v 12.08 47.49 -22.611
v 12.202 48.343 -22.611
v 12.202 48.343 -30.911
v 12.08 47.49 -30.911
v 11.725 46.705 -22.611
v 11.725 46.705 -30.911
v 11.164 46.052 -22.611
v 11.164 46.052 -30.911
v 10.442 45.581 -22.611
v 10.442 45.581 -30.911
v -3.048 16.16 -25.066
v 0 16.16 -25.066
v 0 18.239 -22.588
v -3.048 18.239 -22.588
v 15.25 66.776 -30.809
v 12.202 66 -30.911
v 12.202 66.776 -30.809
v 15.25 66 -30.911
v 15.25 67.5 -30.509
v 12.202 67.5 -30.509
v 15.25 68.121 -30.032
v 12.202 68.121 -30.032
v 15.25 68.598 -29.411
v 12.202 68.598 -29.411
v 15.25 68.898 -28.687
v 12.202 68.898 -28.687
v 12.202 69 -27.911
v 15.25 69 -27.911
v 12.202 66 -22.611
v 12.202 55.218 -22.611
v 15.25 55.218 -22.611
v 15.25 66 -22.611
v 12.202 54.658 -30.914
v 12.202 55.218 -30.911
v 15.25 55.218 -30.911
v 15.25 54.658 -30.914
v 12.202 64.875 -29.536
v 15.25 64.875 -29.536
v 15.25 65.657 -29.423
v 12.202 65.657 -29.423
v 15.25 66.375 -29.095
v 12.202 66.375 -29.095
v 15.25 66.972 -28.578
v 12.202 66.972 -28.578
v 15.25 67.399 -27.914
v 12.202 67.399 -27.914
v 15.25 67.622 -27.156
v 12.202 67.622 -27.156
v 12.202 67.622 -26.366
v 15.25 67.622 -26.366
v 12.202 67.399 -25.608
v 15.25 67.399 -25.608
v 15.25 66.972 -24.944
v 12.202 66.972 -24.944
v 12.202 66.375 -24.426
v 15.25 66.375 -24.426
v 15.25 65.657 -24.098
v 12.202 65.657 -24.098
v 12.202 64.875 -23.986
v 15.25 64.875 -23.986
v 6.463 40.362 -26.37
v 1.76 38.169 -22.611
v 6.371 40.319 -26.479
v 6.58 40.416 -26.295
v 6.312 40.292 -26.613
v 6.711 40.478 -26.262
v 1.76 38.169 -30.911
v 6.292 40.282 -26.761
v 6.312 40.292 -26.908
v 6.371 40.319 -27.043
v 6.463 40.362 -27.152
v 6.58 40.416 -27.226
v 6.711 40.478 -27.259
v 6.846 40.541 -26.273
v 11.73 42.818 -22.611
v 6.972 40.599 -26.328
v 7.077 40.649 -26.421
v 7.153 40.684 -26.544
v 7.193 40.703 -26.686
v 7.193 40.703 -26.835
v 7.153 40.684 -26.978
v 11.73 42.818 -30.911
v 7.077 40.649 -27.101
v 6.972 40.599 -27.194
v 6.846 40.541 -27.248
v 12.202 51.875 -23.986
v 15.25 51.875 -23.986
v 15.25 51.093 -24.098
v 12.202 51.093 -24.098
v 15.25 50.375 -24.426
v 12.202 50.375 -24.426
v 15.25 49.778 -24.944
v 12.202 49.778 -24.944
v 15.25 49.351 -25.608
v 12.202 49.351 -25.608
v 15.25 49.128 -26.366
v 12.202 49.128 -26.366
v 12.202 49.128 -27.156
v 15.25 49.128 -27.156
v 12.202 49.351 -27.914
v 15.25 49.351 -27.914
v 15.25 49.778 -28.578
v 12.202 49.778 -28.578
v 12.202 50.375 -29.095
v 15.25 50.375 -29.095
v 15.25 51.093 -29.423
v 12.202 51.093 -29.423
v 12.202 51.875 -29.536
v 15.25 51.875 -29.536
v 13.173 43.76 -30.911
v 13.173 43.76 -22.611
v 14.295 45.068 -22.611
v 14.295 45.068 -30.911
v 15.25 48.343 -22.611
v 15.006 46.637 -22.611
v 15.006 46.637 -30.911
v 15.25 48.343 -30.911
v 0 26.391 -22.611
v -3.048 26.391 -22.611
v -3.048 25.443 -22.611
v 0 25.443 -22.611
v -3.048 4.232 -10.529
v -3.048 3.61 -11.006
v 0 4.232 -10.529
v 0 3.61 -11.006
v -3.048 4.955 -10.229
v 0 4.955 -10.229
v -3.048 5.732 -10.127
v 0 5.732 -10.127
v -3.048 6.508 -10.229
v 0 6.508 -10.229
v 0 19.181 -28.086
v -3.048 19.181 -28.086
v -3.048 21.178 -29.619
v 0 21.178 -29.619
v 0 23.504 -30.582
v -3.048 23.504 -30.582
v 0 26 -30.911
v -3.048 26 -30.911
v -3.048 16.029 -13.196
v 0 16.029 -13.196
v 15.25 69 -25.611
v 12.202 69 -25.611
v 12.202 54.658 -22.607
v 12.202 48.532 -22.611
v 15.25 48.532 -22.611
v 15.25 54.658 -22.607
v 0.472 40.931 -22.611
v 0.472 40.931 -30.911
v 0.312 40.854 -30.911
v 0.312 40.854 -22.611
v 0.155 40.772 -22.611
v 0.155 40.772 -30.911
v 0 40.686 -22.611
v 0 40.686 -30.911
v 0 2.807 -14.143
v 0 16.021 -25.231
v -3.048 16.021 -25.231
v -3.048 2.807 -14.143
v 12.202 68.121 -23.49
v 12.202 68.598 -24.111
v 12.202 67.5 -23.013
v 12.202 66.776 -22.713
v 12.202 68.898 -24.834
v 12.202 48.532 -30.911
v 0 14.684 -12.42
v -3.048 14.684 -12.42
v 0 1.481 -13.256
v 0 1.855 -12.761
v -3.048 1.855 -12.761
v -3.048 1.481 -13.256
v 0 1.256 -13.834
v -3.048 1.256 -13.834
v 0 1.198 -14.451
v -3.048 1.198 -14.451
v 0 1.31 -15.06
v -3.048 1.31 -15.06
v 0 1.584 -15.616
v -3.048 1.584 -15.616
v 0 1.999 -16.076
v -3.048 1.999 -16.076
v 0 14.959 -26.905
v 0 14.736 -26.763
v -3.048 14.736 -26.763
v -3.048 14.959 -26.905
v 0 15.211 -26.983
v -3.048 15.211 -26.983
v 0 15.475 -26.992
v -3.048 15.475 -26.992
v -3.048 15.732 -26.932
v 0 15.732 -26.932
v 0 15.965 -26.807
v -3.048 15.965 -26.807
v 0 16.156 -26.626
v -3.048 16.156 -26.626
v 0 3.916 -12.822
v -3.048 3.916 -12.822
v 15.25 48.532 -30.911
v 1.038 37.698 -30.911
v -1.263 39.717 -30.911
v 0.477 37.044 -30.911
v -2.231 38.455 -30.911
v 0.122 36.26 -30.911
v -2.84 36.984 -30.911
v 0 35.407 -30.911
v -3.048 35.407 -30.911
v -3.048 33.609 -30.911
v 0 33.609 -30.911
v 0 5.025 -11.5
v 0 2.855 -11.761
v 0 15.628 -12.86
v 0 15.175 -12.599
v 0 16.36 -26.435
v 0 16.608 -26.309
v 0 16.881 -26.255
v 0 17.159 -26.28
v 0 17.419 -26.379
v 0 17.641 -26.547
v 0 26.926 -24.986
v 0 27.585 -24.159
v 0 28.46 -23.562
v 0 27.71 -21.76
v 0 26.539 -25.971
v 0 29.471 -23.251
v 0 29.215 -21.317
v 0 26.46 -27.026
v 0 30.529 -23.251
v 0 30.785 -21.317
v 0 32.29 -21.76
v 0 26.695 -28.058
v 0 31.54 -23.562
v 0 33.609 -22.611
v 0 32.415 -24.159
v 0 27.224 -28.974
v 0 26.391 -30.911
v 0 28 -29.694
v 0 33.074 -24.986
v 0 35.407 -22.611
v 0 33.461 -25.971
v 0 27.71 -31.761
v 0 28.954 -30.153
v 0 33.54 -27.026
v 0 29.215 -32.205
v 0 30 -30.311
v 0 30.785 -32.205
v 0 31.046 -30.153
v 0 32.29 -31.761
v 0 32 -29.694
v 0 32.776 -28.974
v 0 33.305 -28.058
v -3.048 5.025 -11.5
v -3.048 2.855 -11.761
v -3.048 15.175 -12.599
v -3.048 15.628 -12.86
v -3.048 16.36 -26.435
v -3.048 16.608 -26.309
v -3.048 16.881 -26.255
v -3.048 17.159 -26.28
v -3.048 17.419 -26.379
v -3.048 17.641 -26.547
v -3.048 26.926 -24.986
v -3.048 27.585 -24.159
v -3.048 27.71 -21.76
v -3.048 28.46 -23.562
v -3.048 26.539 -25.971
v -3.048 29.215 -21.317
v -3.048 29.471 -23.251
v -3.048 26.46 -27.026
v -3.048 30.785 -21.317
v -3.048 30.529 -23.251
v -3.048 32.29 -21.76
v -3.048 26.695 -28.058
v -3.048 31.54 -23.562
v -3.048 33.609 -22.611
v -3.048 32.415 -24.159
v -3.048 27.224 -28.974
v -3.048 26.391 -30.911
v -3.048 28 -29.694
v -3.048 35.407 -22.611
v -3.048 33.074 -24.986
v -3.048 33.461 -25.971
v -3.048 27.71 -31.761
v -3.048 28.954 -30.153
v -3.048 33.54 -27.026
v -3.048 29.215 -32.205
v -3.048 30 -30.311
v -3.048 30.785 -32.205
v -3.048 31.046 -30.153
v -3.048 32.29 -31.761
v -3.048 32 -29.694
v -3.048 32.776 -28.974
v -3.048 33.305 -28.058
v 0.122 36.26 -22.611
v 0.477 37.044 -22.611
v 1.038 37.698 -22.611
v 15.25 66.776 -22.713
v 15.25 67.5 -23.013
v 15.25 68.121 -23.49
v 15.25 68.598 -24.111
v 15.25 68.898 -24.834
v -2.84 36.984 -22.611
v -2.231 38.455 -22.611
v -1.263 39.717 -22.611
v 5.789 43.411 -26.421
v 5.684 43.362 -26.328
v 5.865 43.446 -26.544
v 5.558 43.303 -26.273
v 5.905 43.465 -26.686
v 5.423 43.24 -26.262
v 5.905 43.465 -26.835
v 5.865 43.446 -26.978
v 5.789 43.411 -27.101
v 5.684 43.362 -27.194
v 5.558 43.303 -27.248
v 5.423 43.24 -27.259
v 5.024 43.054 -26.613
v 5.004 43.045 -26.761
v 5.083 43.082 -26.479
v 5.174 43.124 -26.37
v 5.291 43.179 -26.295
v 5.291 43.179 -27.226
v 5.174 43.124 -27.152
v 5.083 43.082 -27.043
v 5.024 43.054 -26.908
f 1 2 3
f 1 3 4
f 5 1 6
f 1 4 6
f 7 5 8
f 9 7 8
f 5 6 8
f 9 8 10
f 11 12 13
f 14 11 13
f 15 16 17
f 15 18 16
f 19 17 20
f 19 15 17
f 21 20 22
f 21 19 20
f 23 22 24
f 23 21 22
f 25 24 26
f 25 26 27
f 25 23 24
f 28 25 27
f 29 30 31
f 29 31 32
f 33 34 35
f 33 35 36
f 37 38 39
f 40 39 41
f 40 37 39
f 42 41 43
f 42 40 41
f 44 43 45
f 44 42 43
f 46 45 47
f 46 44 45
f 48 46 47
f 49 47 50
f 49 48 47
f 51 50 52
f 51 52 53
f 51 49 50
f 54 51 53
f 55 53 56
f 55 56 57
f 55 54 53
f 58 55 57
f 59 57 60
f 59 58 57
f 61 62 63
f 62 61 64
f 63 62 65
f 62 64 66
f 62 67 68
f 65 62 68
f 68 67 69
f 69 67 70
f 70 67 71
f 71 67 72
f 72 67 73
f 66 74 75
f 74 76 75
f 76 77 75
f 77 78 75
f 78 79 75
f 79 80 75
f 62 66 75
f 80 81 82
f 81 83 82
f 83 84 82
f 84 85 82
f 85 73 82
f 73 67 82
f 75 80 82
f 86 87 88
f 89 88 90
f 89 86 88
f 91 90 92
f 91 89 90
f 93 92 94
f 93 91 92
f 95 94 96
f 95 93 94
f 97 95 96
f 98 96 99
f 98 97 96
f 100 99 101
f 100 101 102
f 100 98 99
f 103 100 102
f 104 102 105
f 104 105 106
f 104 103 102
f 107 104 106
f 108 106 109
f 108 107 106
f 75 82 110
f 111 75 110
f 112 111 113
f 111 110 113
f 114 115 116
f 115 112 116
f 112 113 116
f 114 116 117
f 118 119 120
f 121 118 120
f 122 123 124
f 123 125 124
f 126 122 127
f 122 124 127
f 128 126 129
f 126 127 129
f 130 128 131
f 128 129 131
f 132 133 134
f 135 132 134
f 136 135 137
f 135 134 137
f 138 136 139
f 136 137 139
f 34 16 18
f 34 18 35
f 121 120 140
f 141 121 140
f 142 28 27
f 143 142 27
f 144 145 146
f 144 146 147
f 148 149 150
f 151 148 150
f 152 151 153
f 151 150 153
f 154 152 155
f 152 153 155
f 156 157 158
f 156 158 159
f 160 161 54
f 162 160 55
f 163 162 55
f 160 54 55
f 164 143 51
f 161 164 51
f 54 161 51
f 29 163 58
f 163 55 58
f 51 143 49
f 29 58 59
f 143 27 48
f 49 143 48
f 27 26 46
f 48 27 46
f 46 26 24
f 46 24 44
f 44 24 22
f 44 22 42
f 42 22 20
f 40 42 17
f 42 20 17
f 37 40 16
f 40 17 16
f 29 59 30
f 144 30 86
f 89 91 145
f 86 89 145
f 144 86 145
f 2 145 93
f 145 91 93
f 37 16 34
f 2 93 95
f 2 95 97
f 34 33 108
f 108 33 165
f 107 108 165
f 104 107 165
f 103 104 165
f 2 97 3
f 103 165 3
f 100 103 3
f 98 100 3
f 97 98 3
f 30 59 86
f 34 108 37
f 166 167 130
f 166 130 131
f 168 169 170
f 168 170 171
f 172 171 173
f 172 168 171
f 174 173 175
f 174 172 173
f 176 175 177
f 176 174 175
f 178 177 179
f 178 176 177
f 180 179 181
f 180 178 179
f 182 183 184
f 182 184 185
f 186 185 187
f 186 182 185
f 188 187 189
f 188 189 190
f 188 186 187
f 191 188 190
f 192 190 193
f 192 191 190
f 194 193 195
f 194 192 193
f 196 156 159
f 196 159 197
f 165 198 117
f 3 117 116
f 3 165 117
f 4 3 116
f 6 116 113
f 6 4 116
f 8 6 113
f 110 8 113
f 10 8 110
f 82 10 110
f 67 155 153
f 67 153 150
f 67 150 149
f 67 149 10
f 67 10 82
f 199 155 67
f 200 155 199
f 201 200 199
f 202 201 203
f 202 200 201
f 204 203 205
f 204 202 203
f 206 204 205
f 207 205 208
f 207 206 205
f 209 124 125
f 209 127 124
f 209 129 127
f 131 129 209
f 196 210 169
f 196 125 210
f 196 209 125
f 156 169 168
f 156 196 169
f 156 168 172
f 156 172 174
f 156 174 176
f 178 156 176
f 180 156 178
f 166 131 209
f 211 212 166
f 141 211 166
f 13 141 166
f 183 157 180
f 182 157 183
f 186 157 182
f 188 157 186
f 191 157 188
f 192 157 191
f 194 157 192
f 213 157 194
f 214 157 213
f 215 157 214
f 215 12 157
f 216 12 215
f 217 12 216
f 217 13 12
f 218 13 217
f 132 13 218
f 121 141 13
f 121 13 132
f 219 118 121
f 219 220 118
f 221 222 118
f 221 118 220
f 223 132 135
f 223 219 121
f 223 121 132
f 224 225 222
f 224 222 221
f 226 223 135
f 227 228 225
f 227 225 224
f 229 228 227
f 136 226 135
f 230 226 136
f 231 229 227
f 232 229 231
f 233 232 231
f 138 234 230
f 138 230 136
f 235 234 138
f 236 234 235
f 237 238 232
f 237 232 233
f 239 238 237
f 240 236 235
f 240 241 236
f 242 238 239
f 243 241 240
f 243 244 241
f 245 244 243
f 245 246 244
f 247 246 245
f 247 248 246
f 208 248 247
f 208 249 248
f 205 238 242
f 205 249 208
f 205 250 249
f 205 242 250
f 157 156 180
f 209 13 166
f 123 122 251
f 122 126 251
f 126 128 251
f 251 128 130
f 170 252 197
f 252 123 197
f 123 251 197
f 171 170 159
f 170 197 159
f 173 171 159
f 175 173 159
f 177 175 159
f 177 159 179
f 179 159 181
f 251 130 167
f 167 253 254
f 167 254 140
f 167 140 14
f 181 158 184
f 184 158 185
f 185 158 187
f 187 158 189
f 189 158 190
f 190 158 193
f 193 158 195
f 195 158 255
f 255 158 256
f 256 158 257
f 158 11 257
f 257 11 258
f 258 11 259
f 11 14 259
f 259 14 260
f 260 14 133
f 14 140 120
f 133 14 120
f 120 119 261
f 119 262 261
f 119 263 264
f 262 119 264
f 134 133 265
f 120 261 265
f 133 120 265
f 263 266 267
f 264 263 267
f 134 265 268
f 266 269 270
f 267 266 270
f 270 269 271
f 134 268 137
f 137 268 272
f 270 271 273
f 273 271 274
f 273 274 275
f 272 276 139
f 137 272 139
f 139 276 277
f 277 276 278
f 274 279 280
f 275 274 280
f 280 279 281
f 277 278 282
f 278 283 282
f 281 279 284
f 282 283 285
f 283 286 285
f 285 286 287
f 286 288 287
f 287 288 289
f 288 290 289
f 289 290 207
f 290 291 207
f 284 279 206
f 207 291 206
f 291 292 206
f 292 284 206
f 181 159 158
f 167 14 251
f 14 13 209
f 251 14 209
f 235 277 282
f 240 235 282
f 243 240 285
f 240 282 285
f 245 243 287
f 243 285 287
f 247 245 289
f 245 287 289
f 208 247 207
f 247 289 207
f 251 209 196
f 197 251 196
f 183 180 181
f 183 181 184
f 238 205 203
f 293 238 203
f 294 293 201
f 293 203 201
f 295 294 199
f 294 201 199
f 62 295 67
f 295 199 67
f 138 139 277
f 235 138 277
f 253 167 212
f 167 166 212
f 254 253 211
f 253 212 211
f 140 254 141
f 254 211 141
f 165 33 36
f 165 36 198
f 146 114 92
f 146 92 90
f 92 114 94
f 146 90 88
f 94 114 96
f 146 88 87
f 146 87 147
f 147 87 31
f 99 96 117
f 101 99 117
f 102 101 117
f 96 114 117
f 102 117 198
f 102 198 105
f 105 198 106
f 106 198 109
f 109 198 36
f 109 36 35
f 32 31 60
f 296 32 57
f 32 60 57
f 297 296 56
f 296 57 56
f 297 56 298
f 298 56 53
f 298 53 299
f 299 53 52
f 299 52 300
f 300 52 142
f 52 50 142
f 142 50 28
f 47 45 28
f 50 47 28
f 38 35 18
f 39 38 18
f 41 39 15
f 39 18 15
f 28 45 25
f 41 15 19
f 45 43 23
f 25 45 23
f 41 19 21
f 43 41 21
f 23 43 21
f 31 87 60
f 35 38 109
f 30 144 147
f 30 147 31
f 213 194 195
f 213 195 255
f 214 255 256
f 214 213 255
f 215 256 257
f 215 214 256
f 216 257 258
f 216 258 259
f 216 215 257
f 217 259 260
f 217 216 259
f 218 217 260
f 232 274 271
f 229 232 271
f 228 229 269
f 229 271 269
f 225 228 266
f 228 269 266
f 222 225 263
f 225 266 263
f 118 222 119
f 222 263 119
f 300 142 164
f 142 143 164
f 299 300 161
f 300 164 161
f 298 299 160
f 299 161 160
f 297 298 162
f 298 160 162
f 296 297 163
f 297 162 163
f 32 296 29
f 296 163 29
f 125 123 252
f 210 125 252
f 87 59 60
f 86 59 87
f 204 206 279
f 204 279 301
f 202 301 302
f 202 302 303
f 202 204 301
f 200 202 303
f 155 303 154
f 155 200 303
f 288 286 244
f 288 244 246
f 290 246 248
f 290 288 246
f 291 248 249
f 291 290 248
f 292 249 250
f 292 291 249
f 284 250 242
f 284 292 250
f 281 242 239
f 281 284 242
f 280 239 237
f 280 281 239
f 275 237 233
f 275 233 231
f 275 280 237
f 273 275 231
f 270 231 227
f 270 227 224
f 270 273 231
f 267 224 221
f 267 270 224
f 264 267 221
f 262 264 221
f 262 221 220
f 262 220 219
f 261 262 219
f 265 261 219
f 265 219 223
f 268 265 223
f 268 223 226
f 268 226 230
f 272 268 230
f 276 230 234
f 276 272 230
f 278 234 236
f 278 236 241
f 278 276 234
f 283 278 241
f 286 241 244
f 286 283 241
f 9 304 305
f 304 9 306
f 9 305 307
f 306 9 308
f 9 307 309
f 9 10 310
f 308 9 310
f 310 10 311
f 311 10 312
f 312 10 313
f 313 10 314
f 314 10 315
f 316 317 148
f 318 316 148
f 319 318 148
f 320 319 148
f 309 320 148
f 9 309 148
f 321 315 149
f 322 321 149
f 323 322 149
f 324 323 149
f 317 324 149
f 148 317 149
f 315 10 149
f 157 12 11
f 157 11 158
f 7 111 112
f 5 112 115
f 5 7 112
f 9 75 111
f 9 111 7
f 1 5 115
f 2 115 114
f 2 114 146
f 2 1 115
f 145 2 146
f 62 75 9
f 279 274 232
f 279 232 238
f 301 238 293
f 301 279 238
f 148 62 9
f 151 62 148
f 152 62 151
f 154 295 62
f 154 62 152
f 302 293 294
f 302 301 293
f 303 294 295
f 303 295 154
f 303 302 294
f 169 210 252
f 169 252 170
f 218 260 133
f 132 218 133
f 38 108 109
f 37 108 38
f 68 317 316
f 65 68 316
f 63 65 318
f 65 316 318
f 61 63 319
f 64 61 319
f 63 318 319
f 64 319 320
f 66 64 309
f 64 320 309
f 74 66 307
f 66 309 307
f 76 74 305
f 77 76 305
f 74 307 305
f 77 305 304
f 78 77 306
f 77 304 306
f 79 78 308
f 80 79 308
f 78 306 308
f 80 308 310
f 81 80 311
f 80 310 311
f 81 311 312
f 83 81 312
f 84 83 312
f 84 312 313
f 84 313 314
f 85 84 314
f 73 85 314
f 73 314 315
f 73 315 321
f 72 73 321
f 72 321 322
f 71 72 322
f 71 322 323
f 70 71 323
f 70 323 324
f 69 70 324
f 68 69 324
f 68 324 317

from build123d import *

# Parameters (mm, degrees)
BASE_FLANGE1_START     = -3.048
BASE_FLANGE1_OUTLINE_R = 3.55
BASE_FLANGE1_DEPTH     = 3.048
CHAMFER1_SIZE          = 5.5
CHAMFER1_SIZE2         = 9.526279442
FILLET5_R              = 3
JOG1_START             = -32.26085306
JOG1_DEPTH             = 22.133833772
JOG1_START_2           = -30.91085306
JOG1_2_DEPTH           = 1.375
JOG1_START_3           = -23.98585306
JOG1_3_DEPTH           = 1.375
JOG1_START_4           = -30.914437073
JOG1_4_DEPTH           = 8.307168025
JOG1_5_DEPTH           = 15.25
FILLET4_R              = 3
CUT_EXTRUDE3_DEPTH     = 78.680918765
BOSS_EXTRUDE1_DEPTH    = 3.048
CUT_EXTRUDE4_REACH     = 59.066
SKETCH15_R             = 0.5


with BuildPart() as part:
    # Base-Flange1: read off the stored shape, not the designer's step
    # Base-Flange1 outline → Base-Flange1 (new body)
    with BuildSketch(Plane(origin=(0, 0, 0), x_dir=(0, 0, -1), z_dir=(1, 0, 0)).offset(BASE_FLANGE1_START)):
        with BuildLine():
            Line((11.76085306, 2.855261469), (28.086146356, 19.180554765))
            ThreePointArc((28.086146356, 19.180554765), (30.176735706, 22.309342834), (30.91085306, 26))
            Line((30.91085306, 26), (30.91085306, 26.390637175))
            ThreePointArc((30.91085306, 26.390637175), (32.26085306, 30), (30.91085306, 33.609362825))
            Line((30.91085306, 33.609362825), (30.91085306, 48.531723164))
            Line((30.91085306, 48.531723164), (30.914437073, 54.658476217))
            Line((30.914437073, 54.658476217), (30.91085306, 55.218276836))
            Line((30.91085306, 55.218276836), (30.91085306, 69))
            Line((30.91085306, 69), (22.61085306, 69))
            Line((22.61085306, 69), (22.61085306, 55.218276836))
            Line((22.61085306, 55.218276836), (22.607269048, 54.658476217))
            Line((22.607269048, 54.658476217), (22.61085306, 48.531723164))
            Line((22.61085306, 48.531723164), (22.61085306, 33.609362825))
            ThreePointArc((22.61085306, 33.609362825), (21.26085306, 30), (22.61085306, 26.390637175))
            Line((22.61085306, 26.390637175), (22.61085306, 25.443234037))
            Line((22.61085306, 25.443234037), (5.891866776, 8.724247753))
            Line((5.891866776, 8.724247753), (11.76085306, 2.855261469))
        make_face()
        with Locations((26.76085306, 30)):
            Circle(BASE_FLANGE1_OUTLINE_R, mode=Mode.SUBTRACT)
        with BuildLine():
            ThreePointArc((23.98585306, 64.875), (26.76085306, 67.65), (29.53585306, 64.875))
            Line((29.53585306, 64.875), (29.53585306, 51.875))
            ThreePointArc((29.53585306, 51.875), (26.76085306, 49.1), (23.98585306, 51.875))
            Line((23.98585306, 51.875), (23.98585306, 64.875))
        make_face(mode=Mode.SUBTRACT)
    extrude(amount=BASE_FLANGE1_DEPTH)

    # Chamfer1
    chamfer1_edges = [part.edges().sort_by_distance(p)[0] for p in [
        (-1.524, 8.724247753, -5.891866776),
    ]]
    chamfer1_side = [part.faces().sort_by_distance(p)[0] for p in [
        (-1.524, 5.789754611, -8.826359918),
    ]]
    chamfer(chamfer1_edges, length=CHAMFER1_SIZE, length2=CHAMFER1_SIZE2, reference=chamfer1_side[0])

    # Fillet5
    fillet5_edges = [part.edges().sort_by_distance(p)[0] for p in [
        (-1.524, 15.460344546, -12.627963569),
        (-1.524, 4.835160456, -9.780954073),
    ]]
    fillet(fillet5_edges, radius=FILLET5_R)

    # Jog1: read off the stored shape, not the designer's step
    # Jog1 outline → Jog1 (cut)
    with BuildSketch(Plane.XY.offset(JOG1_START)):
        with BuildLine():
            ThreePointArc((-3.048, 35.406615264), (-2.231290862, 38.454615264), (0, 40.685906126))
            Line((0, 40.685906126), (0, 69))
            Line((0, 69), (-3.048, 69))
            Line((-3.048, 69), (-3.048, 35.406615264))
        make_face()
    extrude(amount=JOG1_DEPTH, mode=Mode.SUBTRACT)

    # Jog1 2 outline → Jog1 2 (add)
    with BuildSketch(Plane.XY.offset(JOG1_START_2)):
        with BuildLine():
            ThreePointArc((0, 35.406615264), (0.477342873, 37.04430447), (1.759859538, 38.169041399))
            Line((1.759859538, 38.169041399), (11.730280924, 42.818325246))
            ThreePointArc((11.730280924, 42.818325246), (14.295314254, 45.067799104), (15.25, 48.343177516))
            Line((15.25, 48.343177516), (15.25, 69))
            Line((15.25, 69), (12.202, 69))
            Line((12.202, 69), (12.202, 48.343177516))
            ThreePointArc((12.202, 48.343177516), (11.724657127, 46.70548831), (10.442140462, 45.580751381))
            Line((10.442140462, 45.580751381), (0.471719076, 40.931467534))
            ThreePointArc((0.471719076, 40.931467534), (0.233180454, 40.813833303), (0, 40.685906126))
            Line((0, 40.685906126), (0, 35.406615264))
        make_face()
    extrude(amount=JOG1_2_DEPTH)

    # Jog1 3 outline → Jog1 3 (add)
    with BuildSketch(Plane.XY.offset(JOG1_START_3)):
        with BuildLine():
            ThreePointArc((0, 35.406615264), (0.477342873, 37.04430447), (1.759859538, 38.169041399))
            Line((1.759859538, 38.169041399), (11.730280924, 42.818325246))
            ThreePointArc((11.730280924, 42.818325246), (14.295314254, 45.067799104), (15.25, 48.343177516))
            Line((15.25, 48.343177516), (15.25, 69))
            Line((15.25, 69), (12.202, 69))
            Line((12.202, 69), (12.202, 48.343177516))
            ThreePointArc((12.202, 48.343177516), (11.724657127, 46.70548831), (10.442140462, 45.580751381))
            Line((10.442140462, 45.580751381), (0.471719076, 40.931467534))
            ThreePointArc((0.471719076, 40.931467534), (0.233180454, 40.813833303), (0, 40.685906126))
            Line((0, 40.685906126), (0, 35.406615264))
        make_face()
    extrude(amount=JOG1_3_DEPTH)

    # Jog1 4 outline → Jog1 4 (add)
    with BuildSketch(Plane.XY.offset(JOG1_START_4)):
        with BuildLine():
            ThreePointArc((0, 35.406615264), (0.477342873, 37.04430447), (1.759859538, 38.169041399))
            Line((1.759859538, 38.169041399), (11.730280924, 42.818325246))
            ThreePointArc((11.730280924, 42.818325246), (14.295314254, 45.067799104), (15.25, 48.343177516))
            Line((15.25, 48.343177516), (15.25, 69))
            Line((15.25, 69), (12.202, 69))
            Line((12.202, 69), (12.202, 48.343177516))
            ThreePointArc((12.202, 48.343177516), (11.724657127, 46.70548831), (10.442140462, 45.580751381))
            Line((10.442140462, 45.580751381), (0.471719076, 40.931467534))
            ThreePointArc((0.471719076, 40.931467534), (0.233180454, 40.813833303), (0, 40.685906126))
            Line((0, 40.685906126), (0, 35.406615264))
        make_face()
    extrude(amount=JOG1_4_DEPTH)

    # Jog1 5 outline → Jog1 5 (cut)
    with BuildSketch(Plane.YZ):
        Polygon((48.531723164, -30.91085306), (34, -30.91085306), (34, -30.914437073), (54.658476217, -30.914437073), align=None)
        Polygon((34, -22.607269048), (34, -22.61085306), (48.531723164, -22.61085306), (54.658476217, -22.607269048), align=None)
        Polygon((55.218276836, -30.91085306), (54.658476217, -30.914437073), (70, -30.914437073), (70, -30.91085306), align=None)
        Polygon((70, -22.607269048), (54.658476217, -22.607269048), (55.218276836, -22.61085306), (70, -22.61085306), align=None)
        with BuildLine():
            Line((64.875, -23.98585306), (51.875, -23.98585306))
            ThreePointArc((51.875, -23.98585306), (49.1, -26.76085306), (51.875, -29.53585306))
            Line((51.875, -29.53585306), (64.875, -29.53585306))
            ThreePointArc((64.875, -29.53585306), (67.65, -26.76085306), (64.875, -23.98585306))
        make_face()
    extrude(amount=JOG1_5_DEPTH, mode=Mode.SUBTRACT)

    # Fillet4
    fillet4_edges = [part.edges().sort_by_distance(p)[0] for p in [
        (13.726, 69, -30.91085306),
        (13.726, 69, -22.61085306),
    ]]
    fillet(fillet4_edges, radius=FILLET4_R)

    # Sketch14<4> → Cut-Extrude3 (cut, through all)
    with BuildSketch(Plane(origin=(0, 0, 0), x_dir=(0, 0, -1), z_dir=(1, 0, 0))):
        Polygon((11.500086567, 5.024730268), (12.821513232, 3.915921641), (25.065698027, 16.160106436), (22.588172835, 18.238996911), align=None)
        Polygon((25.065698027, 16.160106436), (12.821513232, 3.915921641), (14.142939896, 2.807113014), (25.231026163, 16.021379658), align=None)
    extrude(amount=-CUT_EXTRUDE3_DEPTH, mode=Mode.SUBTRACT)

    # Sketch14 → Boss-Extrude1 (add)
    with BuildSketch(Plane(origin=(0, 0, 0), x_dir=(0, 0, -1), z_dir=(1, 0, 0))):
        with BuildLine():
            Line((12.821513232, 3.915921641), (11.76085306, 2.855261469))
            Line((11.76085306, 2.855261469), (12.761421716, 1.854692814))
            ThreePointArc((12.761421716, 1.854692814), (14.450555595, 1.197824573), (16.07601197, 1.999410949))
            Line((16.07601197, 1.999410949), (26.76311505, 14.735804439))
            ThreePointArc((26.76311505, 14.735804439), (26.992415169, 15.474972553), (26.625555608, 16.156413752))
            ThreePointArc((26.625555608, 16.156413752), (26.255439336, 16.881363004), (26.546933828, 17.641342237))
            Line((26.546933828, 17.641342237), (25.065698027, 16.160106436))
            Line((25.065698027, 16.160106436), (25.231026163, 16.021379658))
            Line((25.231026163, 16.021379658), (14.142939896, 2.807113014))
            Line((14.142939896, 2.807113014), (12.821513232, 3.915921641))
        make_face()
    extrude(amount=-BOSS_EXTRUDE1_DEPTH)

    # Sketch15 → Cut-Extrude4 (cut, up to next)
    with BuildSketch(Plane(origin=(-15.593409677, 33.440174967, 0), x_dir=(0.906307787036651, 0.4226182617406973, 0), z_dir=(-0.4226182617406973, 0.906307787036651, 0)), mode=Mode.PRIVATE) as cut_extrude4_sk1:
        with Locations(Location((23.226479732, 26.76085306, 0), (0, 0, 180))):
            Circle(SKETCH15_R)
    cut_extrude4_tool1 = extrude(cut_extrude4_sk1.sketch, amount=-CUT_EXTRUDE4_REACH, mode=Mode.PRIVATE) & part.part
    add(cut_extrude4_tool1.solids().sort_by_distance((5.45693, 43.256109, -26.760853))[0], mode=Mode.SUBTRACT)


solid = part.part
